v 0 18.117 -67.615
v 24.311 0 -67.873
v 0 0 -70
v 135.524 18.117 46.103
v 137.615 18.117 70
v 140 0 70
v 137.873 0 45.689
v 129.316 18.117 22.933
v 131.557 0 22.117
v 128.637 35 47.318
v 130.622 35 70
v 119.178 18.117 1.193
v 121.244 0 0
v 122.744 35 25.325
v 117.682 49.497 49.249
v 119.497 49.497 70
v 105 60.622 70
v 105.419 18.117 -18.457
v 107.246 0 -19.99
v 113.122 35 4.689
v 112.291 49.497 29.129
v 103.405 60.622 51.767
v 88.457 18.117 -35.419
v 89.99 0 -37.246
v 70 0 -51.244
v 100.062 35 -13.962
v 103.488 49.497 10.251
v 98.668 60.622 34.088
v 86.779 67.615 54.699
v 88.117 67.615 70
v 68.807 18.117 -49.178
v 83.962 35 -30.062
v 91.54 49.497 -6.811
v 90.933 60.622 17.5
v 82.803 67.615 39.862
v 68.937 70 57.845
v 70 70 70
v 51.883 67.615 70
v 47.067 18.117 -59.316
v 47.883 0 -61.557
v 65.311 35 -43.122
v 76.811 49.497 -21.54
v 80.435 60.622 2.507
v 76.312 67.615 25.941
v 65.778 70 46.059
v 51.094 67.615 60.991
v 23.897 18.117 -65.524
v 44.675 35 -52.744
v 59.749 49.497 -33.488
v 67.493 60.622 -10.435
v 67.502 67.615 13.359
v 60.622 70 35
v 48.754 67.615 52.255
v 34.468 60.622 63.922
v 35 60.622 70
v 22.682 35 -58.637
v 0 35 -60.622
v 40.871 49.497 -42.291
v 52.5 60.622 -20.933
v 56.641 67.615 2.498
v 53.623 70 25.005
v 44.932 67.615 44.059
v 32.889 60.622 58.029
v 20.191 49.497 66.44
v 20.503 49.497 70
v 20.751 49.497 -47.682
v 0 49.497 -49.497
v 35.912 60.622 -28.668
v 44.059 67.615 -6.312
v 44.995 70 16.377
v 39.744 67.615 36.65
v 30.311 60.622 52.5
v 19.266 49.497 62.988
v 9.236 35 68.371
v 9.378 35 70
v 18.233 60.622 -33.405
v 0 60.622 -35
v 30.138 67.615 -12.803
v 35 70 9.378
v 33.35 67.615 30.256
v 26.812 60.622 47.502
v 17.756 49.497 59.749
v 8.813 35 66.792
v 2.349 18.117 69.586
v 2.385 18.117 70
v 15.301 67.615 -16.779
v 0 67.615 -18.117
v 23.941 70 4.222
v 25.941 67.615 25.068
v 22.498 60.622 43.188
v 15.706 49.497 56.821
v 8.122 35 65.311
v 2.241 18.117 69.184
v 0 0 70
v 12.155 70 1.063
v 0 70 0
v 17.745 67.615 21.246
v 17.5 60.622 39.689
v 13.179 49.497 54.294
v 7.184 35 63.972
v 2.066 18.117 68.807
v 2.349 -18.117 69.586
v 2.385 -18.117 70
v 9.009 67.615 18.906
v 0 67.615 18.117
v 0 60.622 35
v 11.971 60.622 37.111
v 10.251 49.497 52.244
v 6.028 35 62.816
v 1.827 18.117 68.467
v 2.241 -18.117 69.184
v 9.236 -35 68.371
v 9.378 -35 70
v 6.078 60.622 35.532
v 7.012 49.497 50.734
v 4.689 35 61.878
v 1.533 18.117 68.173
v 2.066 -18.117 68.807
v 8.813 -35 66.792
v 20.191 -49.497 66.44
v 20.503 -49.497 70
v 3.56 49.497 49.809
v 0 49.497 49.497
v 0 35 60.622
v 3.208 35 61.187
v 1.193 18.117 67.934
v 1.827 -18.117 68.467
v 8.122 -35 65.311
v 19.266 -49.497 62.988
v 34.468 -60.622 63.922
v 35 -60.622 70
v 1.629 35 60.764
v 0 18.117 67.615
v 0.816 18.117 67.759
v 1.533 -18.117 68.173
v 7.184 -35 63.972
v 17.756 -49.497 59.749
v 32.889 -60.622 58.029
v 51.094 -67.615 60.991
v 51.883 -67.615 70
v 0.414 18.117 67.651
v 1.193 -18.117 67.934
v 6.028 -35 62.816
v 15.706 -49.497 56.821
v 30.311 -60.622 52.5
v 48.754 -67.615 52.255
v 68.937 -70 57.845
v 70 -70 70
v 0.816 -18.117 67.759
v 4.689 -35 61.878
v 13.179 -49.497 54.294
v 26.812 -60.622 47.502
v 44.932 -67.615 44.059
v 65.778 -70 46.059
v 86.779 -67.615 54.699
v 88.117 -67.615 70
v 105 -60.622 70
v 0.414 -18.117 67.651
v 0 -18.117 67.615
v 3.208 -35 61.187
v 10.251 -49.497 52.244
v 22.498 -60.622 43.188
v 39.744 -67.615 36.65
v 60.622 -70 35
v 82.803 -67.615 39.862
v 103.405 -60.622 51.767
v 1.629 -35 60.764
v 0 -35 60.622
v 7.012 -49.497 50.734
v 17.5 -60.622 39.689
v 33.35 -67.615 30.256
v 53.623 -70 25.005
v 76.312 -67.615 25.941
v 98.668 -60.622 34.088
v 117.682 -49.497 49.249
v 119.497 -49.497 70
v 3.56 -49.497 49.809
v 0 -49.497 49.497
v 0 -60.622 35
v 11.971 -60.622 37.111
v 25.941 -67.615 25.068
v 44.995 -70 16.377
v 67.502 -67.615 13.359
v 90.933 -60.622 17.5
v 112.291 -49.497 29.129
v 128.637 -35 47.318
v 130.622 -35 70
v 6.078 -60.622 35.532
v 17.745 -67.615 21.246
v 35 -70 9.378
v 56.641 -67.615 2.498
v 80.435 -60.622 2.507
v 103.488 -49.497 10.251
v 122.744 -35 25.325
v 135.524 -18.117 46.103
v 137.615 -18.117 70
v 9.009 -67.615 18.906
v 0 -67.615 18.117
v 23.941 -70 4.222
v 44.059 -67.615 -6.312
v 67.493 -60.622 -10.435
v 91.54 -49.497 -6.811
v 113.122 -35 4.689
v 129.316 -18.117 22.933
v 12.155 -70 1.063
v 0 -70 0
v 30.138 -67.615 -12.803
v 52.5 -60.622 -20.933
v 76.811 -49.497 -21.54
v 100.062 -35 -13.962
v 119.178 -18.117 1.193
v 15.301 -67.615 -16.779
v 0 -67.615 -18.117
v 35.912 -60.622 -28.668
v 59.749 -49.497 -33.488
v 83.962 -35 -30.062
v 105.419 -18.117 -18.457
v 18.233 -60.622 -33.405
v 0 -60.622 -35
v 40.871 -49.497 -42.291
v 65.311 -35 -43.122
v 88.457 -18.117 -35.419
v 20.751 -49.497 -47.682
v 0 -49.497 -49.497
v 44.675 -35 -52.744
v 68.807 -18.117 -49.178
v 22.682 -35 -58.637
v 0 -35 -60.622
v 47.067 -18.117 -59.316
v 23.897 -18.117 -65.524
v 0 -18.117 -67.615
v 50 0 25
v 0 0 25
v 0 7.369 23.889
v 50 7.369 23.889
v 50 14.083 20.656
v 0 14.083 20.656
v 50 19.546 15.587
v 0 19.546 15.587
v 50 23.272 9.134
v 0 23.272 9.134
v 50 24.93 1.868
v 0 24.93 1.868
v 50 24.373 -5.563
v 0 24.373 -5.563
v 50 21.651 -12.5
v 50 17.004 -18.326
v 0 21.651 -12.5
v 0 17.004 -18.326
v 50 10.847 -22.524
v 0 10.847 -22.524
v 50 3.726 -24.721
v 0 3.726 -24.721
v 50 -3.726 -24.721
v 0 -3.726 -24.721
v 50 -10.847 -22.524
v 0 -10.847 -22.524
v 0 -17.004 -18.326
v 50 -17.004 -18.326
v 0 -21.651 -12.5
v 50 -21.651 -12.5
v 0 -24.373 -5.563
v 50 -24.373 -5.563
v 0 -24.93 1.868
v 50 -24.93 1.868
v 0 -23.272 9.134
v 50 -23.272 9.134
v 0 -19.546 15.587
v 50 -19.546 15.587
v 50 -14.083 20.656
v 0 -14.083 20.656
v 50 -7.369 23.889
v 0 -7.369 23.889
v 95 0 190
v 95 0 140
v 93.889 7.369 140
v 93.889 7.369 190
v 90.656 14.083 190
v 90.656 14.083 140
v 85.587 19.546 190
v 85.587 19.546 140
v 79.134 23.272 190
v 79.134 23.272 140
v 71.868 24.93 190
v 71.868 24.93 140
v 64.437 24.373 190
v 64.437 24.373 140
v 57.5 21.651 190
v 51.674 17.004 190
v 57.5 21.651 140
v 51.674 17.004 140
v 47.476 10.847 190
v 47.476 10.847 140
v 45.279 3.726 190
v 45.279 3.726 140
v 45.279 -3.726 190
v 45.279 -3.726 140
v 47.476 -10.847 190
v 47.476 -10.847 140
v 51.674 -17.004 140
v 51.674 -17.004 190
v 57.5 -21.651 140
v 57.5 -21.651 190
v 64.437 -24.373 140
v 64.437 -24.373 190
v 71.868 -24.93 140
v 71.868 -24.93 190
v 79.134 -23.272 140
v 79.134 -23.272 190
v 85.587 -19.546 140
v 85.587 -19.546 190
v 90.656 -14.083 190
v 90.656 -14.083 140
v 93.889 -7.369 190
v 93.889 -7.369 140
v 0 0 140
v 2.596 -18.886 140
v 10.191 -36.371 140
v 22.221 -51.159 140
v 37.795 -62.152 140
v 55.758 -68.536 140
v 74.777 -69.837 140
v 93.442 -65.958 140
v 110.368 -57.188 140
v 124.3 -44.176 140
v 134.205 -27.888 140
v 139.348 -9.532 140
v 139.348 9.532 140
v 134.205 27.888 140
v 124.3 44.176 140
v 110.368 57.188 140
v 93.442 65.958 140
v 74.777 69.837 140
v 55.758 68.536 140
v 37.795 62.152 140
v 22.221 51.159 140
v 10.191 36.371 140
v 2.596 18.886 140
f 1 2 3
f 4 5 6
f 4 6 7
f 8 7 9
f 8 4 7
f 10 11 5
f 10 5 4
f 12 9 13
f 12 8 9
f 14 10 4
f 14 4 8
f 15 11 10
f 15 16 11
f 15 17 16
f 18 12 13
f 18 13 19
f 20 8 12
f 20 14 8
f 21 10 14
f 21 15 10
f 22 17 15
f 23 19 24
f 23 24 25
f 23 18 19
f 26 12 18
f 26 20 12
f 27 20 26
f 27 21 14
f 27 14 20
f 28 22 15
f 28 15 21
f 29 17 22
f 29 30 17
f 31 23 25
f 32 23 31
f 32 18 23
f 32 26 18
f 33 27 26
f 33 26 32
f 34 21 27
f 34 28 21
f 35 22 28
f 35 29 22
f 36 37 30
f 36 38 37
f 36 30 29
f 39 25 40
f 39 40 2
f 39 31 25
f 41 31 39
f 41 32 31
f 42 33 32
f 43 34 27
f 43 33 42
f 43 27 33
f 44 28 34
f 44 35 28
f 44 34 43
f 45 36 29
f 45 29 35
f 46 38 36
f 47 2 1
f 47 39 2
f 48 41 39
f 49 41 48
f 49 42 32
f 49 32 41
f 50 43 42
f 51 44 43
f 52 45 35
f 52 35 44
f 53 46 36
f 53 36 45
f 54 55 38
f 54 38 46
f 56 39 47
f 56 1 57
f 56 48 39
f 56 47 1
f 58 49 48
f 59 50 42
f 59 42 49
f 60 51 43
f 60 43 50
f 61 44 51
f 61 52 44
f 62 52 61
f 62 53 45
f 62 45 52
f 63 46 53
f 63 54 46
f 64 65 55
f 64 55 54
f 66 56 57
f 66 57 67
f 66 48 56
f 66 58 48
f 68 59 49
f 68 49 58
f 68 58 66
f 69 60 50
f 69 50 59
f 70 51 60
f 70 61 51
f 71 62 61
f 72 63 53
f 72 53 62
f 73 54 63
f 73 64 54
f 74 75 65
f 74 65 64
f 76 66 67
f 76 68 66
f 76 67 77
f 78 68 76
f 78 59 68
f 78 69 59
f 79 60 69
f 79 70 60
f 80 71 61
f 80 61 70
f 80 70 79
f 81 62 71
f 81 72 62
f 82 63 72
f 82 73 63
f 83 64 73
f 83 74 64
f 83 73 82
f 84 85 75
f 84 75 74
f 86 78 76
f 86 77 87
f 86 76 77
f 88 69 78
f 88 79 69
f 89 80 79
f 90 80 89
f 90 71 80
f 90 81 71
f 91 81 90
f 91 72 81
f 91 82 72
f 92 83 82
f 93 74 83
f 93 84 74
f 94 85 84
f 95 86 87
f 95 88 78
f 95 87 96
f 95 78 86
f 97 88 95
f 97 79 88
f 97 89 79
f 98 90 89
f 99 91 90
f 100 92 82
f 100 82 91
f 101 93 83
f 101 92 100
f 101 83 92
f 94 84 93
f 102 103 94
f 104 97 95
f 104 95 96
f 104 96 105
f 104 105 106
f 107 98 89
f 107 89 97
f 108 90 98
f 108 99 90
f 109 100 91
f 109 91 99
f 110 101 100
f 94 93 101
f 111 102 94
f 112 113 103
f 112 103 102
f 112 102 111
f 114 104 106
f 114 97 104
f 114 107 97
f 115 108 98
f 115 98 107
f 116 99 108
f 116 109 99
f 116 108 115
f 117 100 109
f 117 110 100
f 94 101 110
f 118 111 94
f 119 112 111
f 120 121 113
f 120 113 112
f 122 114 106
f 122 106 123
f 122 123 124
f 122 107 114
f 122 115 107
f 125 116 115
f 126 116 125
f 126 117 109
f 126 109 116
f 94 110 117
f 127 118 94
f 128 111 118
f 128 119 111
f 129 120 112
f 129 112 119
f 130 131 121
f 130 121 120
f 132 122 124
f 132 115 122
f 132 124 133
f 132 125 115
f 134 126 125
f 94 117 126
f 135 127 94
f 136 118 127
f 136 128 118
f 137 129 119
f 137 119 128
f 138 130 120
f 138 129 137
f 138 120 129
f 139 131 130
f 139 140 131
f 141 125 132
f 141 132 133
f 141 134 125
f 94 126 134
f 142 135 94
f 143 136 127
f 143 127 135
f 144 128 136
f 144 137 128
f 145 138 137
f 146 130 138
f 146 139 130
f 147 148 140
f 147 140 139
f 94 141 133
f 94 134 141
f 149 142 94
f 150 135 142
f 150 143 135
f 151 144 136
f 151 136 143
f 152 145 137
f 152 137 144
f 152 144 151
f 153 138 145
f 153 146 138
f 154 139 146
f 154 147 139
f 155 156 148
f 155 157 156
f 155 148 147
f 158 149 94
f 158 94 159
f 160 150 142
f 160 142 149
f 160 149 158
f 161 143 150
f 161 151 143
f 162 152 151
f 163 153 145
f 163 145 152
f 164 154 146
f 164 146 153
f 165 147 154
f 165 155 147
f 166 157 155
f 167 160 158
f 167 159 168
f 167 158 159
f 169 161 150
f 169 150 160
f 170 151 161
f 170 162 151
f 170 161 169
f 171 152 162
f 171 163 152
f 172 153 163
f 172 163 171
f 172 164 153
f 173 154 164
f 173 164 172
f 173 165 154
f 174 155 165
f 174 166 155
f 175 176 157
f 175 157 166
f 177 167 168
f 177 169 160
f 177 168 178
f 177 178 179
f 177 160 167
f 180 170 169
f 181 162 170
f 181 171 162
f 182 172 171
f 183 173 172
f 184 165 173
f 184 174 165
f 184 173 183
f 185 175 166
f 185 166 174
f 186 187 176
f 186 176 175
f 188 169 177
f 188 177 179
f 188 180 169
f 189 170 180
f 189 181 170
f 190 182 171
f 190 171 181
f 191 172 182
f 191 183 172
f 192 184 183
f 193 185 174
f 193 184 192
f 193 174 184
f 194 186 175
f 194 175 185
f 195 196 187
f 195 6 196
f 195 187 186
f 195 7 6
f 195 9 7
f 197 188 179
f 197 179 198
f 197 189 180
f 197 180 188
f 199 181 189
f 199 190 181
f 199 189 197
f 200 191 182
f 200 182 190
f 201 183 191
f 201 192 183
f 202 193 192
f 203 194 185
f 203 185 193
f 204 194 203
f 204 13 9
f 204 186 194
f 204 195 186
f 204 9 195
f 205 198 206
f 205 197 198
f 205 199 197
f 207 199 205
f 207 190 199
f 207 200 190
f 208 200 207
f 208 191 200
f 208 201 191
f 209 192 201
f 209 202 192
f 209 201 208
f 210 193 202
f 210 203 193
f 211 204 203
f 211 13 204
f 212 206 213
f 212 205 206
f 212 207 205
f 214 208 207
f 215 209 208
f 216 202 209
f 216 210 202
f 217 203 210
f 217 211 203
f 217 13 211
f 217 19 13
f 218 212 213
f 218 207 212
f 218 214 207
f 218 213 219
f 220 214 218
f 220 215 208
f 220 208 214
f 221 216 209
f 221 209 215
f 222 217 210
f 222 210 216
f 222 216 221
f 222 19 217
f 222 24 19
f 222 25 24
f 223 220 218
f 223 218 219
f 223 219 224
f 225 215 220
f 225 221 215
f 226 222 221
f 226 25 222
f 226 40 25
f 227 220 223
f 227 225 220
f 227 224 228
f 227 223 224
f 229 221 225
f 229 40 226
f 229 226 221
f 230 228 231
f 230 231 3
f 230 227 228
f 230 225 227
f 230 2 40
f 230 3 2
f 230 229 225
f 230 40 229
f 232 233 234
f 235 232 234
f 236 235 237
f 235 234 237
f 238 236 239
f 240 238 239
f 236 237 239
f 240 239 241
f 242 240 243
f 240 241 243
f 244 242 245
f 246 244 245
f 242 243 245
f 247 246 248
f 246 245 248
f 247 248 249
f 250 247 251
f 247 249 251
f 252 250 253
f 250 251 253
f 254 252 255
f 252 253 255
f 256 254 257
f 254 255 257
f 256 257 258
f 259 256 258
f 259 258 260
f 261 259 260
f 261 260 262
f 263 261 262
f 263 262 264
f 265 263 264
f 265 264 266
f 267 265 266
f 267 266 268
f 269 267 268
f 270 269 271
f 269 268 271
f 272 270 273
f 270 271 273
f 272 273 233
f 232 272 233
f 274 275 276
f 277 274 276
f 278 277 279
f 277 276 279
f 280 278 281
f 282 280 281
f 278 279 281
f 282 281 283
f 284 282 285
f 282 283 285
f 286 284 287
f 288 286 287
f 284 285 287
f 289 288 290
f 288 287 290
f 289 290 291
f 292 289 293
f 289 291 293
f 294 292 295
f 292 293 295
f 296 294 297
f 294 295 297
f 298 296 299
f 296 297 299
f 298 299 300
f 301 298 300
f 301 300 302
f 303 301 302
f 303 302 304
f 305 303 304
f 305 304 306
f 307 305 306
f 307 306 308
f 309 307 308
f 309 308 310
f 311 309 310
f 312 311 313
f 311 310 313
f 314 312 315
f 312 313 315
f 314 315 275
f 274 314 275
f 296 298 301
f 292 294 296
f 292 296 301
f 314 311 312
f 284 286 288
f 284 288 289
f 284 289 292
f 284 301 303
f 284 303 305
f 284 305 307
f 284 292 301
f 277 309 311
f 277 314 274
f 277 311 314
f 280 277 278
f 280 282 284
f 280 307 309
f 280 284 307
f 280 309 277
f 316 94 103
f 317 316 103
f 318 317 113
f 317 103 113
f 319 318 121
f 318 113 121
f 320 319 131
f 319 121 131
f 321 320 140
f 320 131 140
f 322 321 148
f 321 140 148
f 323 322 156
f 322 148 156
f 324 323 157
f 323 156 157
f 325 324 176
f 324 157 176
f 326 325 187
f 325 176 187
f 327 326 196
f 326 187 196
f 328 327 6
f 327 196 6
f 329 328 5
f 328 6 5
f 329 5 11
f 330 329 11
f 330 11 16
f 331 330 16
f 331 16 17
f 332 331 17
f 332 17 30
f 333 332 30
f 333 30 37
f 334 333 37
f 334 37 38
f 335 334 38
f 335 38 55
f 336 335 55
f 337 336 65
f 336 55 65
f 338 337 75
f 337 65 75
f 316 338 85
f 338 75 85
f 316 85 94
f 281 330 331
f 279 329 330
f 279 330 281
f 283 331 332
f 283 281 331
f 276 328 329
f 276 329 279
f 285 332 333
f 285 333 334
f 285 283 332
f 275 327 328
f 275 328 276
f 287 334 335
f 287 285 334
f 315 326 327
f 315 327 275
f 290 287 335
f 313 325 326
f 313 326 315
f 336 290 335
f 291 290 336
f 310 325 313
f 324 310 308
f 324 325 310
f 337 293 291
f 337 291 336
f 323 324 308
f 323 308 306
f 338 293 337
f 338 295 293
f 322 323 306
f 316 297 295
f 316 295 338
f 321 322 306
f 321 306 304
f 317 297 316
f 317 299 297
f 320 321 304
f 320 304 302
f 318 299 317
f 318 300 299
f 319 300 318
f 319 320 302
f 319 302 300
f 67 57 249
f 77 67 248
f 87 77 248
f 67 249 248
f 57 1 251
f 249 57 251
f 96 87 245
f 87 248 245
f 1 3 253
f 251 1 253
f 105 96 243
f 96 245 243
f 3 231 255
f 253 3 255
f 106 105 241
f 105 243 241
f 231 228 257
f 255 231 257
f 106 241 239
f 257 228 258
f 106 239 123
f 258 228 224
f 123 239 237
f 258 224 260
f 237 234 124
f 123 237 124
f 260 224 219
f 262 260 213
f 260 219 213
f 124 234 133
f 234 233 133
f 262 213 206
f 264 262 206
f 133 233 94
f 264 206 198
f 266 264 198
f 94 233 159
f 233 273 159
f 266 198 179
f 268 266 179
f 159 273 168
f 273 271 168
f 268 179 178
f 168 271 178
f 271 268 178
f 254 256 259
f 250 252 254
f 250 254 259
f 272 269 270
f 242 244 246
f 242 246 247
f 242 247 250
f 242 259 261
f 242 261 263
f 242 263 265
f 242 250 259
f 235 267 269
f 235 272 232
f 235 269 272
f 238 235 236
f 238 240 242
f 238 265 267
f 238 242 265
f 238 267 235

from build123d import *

# Parameters (mm, degrees)
SKETCH1_R           = 70
SKETCH4_R           = 25
CUT_EXTRUDE1_DEPTH  = 50
SKETCH5_R           = 70
BOSS_EXTRUDE2_DEPTH = 70
SKETCH6_R           = 25
BOSS_EXTRUDE3_DEPTH = 50


with BuildPart() as part:
    # Sweep1: sweep along a path in Sketch2
    with BuildLine(Plane(origin=(0, 0, 0), x_dir=(1, 0, 0), z_dir=(0, 1, 0))) as sweep1_path:
        ThreePointArc((70, -70), (49.497474683, -20.502525317), (0, 0))
    # Sketch1 → Sweep1 (sweep)
    with BuildSketch(Plane(origin=(0, 0, 0), x_dir=(0, 0, -1), z_dir=(1, 0, 0))):
        Circle(SKETCH1_R)
    sweep(path=sweep1_path.line)

    # Sketch4 → Cut-Extrude1 (cut)
    with BuildSketch(Plane.ZY):
        Circle(SKETCH4_R)
    extrude(amount=-CUT_EXTRUDE1_DEPTH, mode=Mode.SUBTRACT)

    # Sketch5 → Boss-Extrude2 (add)
    with BuildSketch(Plane.XY.offset(70)):
        with Locations(Location((70, 0, 0), (0, 0, 180))):
            Circle(SKETCH5_R)
    extrude(amount=BOSS_EXTRUDE2_DEPTH)

    # Sketch6 → Boss-Extrude3 (add)
    with BuildSketch(Plane.XY.offset(140)):
        with Locations((70, 0)):
            Circle(SKETCH6_R)
    extrude(amount=BOSS_EXTRUDE3_DEPTH)


solid = part.part
